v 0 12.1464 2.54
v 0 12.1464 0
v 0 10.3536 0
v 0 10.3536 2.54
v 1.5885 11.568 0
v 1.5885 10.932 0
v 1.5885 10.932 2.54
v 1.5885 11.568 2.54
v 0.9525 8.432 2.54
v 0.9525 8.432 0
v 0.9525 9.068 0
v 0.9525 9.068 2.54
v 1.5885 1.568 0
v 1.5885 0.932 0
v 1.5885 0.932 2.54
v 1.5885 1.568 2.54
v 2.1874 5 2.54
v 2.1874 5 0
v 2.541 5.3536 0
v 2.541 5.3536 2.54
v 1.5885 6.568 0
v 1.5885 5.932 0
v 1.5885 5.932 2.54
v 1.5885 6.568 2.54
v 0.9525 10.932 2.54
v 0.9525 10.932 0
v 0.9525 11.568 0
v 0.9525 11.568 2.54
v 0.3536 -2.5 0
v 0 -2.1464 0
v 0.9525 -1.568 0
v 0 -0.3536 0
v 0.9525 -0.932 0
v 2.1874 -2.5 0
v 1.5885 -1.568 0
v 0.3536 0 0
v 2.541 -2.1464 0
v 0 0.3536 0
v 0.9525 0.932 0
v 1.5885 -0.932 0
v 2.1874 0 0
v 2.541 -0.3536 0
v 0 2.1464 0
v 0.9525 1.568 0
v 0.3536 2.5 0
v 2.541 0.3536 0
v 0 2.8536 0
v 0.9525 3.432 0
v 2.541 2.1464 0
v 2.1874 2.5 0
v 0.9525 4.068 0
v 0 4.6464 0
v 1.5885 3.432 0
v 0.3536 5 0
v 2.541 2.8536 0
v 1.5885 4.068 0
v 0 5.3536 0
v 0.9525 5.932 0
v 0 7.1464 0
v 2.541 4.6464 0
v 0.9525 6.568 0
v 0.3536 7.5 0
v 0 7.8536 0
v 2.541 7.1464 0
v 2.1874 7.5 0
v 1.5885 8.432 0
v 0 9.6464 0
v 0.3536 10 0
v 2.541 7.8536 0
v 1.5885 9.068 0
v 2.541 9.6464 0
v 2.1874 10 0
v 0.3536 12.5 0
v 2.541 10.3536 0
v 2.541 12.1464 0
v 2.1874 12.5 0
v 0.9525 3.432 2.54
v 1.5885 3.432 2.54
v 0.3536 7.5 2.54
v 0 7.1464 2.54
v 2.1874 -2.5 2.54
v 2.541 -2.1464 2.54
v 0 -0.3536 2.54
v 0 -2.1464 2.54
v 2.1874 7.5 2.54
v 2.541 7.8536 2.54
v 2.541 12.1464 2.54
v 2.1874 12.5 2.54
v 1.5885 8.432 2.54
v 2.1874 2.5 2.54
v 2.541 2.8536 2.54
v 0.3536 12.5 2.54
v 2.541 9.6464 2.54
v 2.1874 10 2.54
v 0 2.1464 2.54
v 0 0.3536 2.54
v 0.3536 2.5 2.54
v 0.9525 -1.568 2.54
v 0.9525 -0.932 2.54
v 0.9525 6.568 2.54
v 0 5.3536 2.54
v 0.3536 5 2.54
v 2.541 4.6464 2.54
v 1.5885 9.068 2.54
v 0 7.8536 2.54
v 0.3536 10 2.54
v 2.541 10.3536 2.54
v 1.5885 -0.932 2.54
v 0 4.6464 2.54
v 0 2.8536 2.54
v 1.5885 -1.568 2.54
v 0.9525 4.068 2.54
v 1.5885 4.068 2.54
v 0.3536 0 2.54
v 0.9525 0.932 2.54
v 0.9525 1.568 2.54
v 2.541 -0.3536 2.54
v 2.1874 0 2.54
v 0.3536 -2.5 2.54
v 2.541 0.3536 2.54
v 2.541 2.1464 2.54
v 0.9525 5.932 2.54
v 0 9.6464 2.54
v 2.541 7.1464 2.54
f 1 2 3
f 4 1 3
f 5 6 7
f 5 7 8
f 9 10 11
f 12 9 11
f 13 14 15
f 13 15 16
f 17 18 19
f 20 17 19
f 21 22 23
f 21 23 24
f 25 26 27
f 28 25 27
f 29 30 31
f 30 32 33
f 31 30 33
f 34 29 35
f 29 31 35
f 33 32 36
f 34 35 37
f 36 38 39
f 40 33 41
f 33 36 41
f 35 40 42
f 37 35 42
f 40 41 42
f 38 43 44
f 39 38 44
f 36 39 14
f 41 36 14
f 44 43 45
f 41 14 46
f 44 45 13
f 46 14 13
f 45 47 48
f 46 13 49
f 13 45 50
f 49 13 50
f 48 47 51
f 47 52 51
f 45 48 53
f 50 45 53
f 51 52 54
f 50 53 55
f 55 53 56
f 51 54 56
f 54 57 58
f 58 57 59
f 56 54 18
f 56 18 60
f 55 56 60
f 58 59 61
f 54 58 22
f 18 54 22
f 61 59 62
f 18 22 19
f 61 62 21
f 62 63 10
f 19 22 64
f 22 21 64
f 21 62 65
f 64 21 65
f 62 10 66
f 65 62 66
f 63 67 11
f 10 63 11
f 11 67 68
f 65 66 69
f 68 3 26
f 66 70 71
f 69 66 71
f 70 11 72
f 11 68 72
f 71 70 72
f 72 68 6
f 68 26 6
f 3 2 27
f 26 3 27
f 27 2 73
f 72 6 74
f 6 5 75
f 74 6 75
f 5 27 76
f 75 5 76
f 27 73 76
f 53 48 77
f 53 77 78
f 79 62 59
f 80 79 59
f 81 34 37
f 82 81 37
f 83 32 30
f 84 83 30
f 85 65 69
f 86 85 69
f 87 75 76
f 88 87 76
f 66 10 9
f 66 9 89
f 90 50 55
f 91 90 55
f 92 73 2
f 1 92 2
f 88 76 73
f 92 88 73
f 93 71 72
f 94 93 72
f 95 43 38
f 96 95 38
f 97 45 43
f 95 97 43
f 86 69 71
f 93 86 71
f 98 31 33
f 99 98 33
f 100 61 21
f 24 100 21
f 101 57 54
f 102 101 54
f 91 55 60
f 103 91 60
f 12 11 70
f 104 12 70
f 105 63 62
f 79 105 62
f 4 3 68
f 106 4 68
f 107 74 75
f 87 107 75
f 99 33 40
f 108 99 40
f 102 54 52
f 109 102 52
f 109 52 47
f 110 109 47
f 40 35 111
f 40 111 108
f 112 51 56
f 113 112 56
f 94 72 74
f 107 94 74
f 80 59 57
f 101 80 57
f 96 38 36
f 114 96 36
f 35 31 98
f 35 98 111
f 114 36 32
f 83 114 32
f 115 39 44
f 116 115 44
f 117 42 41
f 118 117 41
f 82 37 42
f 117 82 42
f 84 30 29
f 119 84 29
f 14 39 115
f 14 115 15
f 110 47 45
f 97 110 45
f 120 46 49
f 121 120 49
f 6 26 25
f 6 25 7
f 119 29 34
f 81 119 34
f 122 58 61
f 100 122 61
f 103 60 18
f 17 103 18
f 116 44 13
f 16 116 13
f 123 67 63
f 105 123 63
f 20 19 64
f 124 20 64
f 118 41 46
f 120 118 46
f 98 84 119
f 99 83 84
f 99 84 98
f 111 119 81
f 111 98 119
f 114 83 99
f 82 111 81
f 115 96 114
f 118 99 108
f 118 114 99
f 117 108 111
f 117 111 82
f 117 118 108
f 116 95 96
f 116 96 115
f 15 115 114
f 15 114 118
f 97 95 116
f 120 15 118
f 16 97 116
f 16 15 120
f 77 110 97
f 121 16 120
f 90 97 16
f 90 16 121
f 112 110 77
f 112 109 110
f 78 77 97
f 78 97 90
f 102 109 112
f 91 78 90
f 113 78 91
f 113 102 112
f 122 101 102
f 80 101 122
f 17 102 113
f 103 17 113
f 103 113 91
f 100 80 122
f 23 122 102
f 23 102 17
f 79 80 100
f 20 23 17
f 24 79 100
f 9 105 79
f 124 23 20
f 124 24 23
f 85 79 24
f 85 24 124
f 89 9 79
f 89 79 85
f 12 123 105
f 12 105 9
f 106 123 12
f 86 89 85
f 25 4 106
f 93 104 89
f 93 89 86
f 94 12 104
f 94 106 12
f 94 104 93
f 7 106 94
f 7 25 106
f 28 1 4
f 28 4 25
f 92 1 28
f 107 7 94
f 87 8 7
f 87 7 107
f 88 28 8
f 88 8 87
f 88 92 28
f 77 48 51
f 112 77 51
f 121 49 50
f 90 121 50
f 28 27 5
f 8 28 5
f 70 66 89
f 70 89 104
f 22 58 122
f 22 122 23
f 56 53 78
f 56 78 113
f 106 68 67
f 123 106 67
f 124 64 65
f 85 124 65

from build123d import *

# Parameters (mm, degrees)
PIN_BODY_W          = 0.636
PIN_BODY_H          = 0.636
BOSS_EXTRUDE1_DEPTH = 2.54


with BuildPart() as part:
    # pin_body → Boss-Extrude1 (new body)
    with BuildSketch(Plane.XY):
        Polygon((0, 2.146446609), (0, 0.353553391), (0.353553391, 0), (0, -0.353553391), (0, -2.146446609), (0.353553391, -2.5), (2.187446609, -2.5), (2.541, -2.146446609), (2.541, -0.353553391), (2.187446609, 0), (2.541, 0.353553391), (2.541, 2.146446609), (2.187446609, 2.5), (2.541, 2.853553391), (2.541, 4.646446609), (2.187446609, 5), (2.541, 5.353553391), (2.541, 7.146446609), (2.187446609, 7.5), (2.541, 7.853553391), (2.541, 9.646446609), (2.187446609, 10), (2.541, 10.353553391), (2.541, 12.146446609), (2.187446609, 12.5), (0.353553391, 12.5), (0, 12.146446609), (0, 10.353553391), (0.353553391, 10), (0, 9.646446609), (0, 7.853553391), (0.353553391, 7.5), (0, 7.146446609), (0, 5.353553391), (0.353553391, 5), (0, 4.646446609), (0, 2.853553391), (0.353553391, 2.5), align=None)
        with Locations((1.2705, -1.25)):
            Rectangle(PIN_BODY_W, PIN_BODY_H, mode=Mode.SUBTRACT)
        with Locations((1.2705, 1.25)):
            Rectangle(PIN_BODY_W, PIN_BODY_H, mode=Mode.SUBTRACT)
        with Locations((1.2705, 3.75)):
            Rectangle(PIN_BODY_W, PIN_BODY_H, mode=Mode.SUBTRACT)
        with Locations((1.2705, 6.25)):
            Rectangle(PIN_BODY_W, PIN_BODY_H, mode=Mode.SUBTRACT)
        with Locations((1.2705, 8.75)):
            Rectangle(PIN_BODY_W, PIN_BODY_H, mode=Mode.SUBTRACT)
        with Locations((1.2705, 11.25)):
            Rectangle(PIN_BODY_W, PIN_BODY_H, mode=Mode.SUBTRACT)
    extrude(amount=BOSS_EXTRUDE1_DEPTH)


solid = part.part
